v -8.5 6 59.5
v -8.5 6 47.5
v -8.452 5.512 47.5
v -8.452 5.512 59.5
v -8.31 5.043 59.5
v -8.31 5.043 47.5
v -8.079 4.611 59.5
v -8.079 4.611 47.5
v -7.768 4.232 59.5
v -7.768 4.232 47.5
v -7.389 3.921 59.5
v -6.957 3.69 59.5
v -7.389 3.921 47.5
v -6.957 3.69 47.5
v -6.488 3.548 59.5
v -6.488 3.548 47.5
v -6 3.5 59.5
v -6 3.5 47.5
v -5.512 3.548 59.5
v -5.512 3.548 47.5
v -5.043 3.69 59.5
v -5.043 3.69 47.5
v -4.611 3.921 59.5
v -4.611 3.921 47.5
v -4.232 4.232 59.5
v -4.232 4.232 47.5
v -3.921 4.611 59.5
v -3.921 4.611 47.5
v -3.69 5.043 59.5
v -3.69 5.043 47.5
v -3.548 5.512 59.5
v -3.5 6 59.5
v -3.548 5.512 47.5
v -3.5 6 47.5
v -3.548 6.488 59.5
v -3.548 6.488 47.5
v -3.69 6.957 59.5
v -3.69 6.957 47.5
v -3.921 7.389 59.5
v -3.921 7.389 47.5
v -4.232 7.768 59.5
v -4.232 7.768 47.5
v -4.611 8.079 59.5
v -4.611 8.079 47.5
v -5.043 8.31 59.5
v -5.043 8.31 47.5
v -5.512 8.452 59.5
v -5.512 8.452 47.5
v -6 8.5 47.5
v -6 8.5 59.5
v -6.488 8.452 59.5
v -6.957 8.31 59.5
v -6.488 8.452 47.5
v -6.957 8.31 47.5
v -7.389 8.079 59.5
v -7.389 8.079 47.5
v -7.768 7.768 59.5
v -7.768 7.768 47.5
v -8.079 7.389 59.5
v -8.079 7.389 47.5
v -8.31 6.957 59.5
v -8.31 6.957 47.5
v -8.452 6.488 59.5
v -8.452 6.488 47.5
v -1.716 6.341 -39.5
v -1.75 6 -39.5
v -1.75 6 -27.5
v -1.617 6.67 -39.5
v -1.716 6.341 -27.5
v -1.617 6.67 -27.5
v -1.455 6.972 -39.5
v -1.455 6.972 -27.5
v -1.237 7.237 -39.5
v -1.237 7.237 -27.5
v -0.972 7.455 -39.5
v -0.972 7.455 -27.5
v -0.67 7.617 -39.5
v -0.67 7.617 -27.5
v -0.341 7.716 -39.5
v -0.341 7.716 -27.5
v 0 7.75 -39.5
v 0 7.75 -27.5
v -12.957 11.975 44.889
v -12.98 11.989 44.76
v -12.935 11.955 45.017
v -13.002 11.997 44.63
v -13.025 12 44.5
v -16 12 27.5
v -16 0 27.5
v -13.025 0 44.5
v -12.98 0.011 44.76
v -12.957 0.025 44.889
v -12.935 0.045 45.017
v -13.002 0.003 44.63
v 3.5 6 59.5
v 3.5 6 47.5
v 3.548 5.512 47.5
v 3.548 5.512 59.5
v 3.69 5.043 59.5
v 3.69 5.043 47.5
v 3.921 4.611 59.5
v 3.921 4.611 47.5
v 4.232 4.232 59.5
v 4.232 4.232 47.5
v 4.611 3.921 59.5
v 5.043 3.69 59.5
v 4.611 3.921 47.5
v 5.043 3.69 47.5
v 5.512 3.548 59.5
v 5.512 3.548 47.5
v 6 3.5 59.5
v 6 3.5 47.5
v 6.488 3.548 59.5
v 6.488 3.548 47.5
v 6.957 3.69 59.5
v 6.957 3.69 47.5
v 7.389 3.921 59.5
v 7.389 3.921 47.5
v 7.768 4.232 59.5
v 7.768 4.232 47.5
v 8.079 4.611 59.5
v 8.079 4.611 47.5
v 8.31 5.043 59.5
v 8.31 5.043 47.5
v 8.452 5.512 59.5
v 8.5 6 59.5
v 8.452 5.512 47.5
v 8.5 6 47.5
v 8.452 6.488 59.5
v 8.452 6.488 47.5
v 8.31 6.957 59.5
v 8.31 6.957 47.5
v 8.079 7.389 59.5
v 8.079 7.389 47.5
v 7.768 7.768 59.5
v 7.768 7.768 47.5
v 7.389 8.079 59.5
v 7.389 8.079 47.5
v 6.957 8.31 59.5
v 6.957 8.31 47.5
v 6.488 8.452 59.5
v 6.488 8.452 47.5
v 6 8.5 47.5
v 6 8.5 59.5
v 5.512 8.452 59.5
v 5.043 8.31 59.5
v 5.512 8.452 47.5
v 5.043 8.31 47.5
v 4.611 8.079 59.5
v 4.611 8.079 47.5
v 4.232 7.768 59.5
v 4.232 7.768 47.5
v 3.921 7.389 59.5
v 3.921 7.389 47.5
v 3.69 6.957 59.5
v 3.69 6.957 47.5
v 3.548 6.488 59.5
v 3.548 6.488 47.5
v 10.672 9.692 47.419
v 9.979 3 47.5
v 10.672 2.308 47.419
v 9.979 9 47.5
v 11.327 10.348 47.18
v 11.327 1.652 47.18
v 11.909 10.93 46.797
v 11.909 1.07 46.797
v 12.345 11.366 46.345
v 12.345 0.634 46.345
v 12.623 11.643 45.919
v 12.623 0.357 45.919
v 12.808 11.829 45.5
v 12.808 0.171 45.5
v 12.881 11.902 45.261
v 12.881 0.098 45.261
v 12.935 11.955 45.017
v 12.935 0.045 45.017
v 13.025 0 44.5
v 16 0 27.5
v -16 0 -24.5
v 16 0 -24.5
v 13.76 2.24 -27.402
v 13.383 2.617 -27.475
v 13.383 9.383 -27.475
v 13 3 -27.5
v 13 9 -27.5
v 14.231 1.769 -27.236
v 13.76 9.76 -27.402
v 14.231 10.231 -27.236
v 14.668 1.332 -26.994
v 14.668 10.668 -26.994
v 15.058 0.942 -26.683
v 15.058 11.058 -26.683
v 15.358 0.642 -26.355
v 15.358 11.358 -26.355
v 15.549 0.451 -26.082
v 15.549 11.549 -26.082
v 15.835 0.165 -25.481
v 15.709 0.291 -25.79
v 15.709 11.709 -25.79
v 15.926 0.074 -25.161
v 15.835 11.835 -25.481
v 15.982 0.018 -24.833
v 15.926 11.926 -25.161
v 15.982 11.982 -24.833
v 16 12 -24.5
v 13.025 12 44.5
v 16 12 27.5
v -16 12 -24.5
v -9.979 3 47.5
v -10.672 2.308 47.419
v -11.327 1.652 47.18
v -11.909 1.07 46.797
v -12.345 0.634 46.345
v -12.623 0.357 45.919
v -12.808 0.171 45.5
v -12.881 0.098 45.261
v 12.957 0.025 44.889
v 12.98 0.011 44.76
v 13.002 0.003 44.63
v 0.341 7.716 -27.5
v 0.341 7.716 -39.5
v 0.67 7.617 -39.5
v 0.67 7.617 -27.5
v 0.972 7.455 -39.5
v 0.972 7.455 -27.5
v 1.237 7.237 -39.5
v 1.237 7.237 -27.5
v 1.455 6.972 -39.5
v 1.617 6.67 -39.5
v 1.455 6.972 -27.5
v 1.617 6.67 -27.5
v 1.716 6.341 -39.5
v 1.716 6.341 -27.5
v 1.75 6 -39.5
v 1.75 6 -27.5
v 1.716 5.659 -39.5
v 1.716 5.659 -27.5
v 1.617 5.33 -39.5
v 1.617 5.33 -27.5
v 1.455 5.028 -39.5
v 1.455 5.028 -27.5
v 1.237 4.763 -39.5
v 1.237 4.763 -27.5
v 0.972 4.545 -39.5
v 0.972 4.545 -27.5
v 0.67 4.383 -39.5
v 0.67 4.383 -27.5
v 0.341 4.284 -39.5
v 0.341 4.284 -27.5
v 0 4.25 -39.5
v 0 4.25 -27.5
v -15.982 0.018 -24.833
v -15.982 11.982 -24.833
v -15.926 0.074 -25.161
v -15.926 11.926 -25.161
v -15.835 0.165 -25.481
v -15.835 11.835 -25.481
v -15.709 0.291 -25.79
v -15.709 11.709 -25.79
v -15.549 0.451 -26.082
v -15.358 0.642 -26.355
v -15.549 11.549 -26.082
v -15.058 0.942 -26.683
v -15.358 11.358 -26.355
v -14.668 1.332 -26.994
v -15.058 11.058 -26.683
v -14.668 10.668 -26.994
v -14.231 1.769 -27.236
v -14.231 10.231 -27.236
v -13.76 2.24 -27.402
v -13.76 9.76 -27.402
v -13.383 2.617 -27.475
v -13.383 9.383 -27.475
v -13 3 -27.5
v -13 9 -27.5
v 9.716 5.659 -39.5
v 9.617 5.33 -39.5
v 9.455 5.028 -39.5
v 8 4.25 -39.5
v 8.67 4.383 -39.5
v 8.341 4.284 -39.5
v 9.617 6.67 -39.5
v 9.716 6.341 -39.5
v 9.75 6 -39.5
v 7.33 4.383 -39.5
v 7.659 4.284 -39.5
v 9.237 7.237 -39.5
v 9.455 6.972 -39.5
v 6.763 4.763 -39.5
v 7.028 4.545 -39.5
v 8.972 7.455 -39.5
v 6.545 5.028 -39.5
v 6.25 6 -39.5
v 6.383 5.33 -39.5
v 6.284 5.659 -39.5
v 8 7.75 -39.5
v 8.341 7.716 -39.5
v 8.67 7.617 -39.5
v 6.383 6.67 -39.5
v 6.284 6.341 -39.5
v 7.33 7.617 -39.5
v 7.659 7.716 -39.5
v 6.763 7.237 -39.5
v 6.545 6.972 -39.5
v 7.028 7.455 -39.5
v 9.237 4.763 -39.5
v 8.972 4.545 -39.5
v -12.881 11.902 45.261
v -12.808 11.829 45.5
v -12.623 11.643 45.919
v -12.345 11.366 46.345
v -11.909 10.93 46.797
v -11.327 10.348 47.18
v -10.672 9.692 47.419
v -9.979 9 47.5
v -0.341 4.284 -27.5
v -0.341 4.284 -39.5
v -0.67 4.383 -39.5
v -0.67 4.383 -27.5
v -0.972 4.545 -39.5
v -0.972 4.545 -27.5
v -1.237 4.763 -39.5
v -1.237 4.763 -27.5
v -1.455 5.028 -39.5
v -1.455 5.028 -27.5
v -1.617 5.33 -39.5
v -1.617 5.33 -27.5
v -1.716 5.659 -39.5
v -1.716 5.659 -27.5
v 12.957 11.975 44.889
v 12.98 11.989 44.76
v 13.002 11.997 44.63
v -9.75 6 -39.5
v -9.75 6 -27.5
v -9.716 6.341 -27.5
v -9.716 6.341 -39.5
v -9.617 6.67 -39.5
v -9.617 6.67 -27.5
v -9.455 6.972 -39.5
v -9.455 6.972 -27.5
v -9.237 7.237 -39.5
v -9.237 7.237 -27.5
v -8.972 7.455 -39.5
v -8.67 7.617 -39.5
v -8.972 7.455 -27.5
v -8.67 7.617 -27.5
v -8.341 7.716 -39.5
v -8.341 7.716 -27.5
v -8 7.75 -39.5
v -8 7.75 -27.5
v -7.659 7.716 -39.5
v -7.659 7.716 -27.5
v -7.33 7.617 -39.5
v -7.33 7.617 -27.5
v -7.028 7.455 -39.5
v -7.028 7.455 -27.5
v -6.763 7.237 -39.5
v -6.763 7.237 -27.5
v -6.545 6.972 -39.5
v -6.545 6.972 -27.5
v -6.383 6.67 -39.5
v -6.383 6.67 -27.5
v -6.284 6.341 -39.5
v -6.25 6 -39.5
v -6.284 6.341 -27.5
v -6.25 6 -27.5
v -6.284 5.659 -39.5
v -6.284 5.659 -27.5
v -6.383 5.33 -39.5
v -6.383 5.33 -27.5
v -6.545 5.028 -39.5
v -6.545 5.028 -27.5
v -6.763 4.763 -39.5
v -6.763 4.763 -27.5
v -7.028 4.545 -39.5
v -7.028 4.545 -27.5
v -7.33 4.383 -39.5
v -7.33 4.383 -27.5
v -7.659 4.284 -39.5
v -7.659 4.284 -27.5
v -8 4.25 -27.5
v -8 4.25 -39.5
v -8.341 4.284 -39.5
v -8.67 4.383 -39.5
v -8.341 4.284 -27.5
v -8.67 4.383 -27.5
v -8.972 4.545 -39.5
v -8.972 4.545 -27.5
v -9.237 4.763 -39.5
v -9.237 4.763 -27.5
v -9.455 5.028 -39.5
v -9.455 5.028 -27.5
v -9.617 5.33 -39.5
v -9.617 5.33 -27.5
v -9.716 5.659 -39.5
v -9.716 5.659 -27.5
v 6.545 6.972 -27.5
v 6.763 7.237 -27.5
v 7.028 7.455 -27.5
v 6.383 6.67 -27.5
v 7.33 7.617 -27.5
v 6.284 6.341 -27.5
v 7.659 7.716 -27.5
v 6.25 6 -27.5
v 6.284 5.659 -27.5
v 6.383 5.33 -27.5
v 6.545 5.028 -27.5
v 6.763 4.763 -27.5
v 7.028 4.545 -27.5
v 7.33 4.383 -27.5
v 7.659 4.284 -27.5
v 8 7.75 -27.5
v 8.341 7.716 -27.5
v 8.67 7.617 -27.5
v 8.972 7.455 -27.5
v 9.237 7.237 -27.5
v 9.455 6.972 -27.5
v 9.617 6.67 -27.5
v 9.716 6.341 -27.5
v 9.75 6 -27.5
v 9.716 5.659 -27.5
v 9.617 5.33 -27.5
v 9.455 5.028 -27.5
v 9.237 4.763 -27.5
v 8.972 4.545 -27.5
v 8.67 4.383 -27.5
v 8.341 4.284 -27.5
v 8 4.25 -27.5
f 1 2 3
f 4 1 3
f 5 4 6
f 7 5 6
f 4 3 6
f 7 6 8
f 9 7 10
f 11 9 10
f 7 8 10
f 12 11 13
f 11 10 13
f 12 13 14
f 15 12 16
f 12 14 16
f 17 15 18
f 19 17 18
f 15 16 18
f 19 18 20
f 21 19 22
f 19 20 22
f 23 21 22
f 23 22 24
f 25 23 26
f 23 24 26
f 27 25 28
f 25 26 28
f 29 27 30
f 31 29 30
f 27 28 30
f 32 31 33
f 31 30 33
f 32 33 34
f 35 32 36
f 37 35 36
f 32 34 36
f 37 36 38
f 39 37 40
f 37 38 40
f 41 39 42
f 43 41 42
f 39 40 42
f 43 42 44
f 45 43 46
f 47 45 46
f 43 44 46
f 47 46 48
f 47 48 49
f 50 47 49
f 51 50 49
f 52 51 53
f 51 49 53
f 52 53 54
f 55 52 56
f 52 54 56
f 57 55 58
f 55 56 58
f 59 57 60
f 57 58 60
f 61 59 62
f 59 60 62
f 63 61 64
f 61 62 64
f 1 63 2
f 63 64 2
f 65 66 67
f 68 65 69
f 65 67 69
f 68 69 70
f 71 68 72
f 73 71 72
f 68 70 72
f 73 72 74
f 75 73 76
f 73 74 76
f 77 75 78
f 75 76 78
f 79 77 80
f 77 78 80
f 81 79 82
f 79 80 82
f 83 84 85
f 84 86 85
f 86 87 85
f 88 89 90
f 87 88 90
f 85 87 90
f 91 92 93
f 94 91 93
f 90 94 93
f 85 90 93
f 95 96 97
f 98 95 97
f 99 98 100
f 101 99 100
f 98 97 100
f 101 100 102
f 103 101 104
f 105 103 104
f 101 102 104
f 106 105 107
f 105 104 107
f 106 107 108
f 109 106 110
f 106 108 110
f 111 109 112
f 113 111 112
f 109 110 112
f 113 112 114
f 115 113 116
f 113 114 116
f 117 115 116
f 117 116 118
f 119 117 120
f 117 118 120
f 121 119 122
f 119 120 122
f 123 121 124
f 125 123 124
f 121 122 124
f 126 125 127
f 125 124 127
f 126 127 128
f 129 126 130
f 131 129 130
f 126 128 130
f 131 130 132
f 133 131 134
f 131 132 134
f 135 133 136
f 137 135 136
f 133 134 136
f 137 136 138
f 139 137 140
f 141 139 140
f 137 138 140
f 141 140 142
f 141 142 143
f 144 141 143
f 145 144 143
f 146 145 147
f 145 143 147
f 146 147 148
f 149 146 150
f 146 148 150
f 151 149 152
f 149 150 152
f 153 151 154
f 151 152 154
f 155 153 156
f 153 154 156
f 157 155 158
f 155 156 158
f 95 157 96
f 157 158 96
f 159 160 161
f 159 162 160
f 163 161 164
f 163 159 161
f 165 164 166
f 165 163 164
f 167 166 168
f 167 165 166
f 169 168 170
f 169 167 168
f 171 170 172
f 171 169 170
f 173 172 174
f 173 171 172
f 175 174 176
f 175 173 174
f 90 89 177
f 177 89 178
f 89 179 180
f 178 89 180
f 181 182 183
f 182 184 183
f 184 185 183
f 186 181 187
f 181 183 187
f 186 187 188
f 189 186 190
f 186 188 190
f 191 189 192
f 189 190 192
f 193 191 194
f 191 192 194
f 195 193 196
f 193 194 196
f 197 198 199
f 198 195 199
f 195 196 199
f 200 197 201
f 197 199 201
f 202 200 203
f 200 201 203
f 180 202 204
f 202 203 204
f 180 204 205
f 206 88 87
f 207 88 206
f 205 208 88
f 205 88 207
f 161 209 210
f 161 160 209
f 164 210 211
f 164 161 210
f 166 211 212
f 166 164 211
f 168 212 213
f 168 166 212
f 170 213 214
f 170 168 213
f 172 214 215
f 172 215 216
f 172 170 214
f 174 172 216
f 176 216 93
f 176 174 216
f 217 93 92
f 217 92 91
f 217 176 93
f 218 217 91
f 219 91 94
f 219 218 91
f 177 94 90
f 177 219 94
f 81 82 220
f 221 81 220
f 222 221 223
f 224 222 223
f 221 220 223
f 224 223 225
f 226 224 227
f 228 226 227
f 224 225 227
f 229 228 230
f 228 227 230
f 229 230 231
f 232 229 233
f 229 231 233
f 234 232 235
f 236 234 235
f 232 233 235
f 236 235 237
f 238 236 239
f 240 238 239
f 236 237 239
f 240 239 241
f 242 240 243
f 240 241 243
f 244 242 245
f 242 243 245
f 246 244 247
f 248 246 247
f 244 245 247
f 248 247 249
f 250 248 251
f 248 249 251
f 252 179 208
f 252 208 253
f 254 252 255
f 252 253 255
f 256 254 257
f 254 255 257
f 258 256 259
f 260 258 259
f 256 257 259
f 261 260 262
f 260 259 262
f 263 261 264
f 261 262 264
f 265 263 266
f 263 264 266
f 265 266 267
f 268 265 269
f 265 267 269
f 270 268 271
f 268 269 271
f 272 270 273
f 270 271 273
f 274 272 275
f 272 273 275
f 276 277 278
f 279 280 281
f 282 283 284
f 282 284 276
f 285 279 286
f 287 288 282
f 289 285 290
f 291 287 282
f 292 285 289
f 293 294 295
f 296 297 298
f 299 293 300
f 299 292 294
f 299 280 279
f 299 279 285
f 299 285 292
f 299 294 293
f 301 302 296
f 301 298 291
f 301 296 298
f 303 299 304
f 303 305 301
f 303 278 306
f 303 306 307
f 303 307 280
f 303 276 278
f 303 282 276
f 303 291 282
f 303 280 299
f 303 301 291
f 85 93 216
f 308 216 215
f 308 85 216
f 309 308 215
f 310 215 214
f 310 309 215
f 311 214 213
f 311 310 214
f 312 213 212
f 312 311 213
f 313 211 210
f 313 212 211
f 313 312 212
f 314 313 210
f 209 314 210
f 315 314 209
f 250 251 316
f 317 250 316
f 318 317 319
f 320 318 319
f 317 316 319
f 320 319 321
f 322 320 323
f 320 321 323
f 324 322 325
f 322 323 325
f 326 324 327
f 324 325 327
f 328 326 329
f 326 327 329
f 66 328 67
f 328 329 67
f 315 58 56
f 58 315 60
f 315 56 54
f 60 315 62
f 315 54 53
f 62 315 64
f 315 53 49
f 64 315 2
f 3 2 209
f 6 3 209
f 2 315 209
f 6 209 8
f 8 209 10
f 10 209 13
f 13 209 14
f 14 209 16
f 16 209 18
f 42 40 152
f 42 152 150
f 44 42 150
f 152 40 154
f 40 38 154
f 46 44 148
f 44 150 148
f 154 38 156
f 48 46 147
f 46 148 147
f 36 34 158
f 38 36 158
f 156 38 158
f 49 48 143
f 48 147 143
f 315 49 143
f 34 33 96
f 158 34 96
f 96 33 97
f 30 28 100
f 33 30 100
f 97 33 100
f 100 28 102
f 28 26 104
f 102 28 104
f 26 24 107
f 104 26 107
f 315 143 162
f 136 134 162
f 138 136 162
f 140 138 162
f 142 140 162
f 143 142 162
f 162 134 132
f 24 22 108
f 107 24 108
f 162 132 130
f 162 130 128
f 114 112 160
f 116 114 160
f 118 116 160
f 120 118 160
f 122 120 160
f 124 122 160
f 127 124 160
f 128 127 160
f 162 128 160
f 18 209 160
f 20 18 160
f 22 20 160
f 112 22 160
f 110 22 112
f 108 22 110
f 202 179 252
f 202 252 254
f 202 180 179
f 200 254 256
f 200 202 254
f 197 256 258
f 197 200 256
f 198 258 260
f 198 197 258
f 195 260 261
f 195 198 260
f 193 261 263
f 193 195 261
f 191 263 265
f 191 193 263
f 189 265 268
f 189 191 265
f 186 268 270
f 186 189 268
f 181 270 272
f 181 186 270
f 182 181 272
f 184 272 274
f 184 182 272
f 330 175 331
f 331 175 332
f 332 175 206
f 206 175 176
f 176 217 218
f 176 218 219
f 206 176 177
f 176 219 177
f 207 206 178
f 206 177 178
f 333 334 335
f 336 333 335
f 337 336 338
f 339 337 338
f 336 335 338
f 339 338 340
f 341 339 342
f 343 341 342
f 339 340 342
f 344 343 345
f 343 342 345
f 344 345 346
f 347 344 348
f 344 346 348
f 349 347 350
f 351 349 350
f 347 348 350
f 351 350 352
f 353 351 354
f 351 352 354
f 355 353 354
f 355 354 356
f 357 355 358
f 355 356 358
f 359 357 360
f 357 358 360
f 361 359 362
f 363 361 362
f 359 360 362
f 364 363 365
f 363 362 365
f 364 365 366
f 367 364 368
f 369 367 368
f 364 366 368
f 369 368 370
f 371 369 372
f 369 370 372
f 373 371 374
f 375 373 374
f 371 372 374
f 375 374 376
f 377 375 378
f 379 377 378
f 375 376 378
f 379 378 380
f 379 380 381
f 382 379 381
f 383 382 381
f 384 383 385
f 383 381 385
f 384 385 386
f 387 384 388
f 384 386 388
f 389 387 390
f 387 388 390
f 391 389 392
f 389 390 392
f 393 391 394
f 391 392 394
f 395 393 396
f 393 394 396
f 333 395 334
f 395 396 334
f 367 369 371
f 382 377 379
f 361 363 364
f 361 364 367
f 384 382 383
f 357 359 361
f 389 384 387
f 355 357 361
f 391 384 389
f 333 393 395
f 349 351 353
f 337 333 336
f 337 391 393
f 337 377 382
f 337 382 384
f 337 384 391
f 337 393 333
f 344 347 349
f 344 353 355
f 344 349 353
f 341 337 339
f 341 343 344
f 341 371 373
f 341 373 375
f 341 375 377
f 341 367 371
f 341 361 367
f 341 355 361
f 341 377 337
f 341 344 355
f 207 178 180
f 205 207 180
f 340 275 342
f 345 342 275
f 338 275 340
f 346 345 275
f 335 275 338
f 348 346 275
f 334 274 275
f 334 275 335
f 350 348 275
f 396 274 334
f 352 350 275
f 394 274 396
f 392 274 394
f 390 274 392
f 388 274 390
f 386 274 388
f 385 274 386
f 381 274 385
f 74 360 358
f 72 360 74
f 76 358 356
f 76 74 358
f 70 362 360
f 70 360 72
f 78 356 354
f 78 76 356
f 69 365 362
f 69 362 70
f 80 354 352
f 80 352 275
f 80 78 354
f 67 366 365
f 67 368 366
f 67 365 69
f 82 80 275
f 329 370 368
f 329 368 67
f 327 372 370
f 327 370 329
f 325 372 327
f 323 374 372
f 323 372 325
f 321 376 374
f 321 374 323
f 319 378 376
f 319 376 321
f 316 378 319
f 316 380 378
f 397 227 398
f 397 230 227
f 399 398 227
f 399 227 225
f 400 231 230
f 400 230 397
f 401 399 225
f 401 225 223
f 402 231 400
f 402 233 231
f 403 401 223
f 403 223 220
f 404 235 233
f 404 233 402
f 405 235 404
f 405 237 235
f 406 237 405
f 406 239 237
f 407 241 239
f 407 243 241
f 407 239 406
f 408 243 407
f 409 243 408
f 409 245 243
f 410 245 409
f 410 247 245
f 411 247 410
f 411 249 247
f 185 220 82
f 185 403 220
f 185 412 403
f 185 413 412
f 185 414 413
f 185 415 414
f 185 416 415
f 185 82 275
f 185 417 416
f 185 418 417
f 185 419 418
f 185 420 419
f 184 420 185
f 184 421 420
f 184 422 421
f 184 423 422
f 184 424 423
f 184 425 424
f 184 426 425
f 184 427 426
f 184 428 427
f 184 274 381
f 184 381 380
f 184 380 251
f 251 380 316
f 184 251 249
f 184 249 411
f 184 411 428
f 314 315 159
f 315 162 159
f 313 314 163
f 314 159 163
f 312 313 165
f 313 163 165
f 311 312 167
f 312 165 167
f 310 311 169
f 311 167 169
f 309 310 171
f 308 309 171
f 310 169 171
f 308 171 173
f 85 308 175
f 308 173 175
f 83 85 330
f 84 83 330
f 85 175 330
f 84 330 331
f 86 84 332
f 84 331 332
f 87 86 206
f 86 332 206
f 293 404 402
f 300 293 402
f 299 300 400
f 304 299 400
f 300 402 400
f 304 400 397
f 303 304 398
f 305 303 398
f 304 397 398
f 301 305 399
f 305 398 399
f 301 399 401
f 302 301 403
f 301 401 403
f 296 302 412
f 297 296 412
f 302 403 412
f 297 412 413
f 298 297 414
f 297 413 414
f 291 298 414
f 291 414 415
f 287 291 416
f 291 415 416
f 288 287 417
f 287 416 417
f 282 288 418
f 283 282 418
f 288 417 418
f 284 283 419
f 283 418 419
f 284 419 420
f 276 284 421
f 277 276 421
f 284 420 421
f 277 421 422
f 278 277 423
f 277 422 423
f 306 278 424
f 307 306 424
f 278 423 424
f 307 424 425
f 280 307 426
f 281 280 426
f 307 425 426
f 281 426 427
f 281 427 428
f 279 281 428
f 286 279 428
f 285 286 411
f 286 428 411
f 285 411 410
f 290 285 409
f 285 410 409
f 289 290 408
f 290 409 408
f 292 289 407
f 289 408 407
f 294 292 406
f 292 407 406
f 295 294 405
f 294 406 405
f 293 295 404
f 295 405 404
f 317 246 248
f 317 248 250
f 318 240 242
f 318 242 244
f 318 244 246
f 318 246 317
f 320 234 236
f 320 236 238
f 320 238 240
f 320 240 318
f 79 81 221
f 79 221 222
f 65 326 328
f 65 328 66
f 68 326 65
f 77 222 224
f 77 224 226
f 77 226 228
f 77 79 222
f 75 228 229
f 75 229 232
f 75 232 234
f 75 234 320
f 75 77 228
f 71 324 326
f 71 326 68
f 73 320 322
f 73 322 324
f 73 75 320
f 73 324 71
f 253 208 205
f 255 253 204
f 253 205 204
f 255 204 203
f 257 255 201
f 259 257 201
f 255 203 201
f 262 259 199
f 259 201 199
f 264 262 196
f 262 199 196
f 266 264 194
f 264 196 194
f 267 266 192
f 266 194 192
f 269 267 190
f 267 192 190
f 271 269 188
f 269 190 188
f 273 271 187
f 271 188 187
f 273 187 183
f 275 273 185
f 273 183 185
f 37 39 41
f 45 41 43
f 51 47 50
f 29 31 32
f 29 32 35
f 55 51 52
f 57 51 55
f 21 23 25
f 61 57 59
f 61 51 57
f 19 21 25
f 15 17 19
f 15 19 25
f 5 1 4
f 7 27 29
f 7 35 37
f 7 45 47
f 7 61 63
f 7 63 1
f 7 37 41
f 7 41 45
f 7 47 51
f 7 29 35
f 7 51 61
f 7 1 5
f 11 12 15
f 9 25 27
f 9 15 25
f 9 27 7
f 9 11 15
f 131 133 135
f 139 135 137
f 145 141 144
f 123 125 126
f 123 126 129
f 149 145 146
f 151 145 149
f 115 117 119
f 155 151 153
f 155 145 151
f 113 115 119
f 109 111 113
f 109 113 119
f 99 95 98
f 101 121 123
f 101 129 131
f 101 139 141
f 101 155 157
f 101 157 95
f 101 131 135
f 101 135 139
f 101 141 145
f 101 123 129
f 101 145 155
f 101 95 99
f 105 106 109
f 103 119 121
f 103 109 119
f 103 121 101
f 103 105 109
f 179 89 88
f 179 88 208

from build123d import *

# Parameters (mm, degrees)
EXTRUDE_1_DEPTH = 12
EXTRUDE_2_DEPTH = 12
SKETCH_2_R      = 2.5
EXTRUDE_3_DEPTH = 12
SKETCH_3_R      = 1.75
EXTRUDE_4_DEPTH = 12
FILLET_1_R      = 3


with BuildPart() as part:
    # 草图1 → 凸台-拉伸1 (new body)
    with BuildSketch(Plane(origin=(0, 0, 0), x_dir=(1, 0, 0), z_dir=(0, 1, 0))):
        Polygon((16, 27.5), (-16, 27.5), (-16, -27.5), (0, -27.5), (16, -27.5), align=None)
    extrude(amount=EXTRUDE_1_DEPTH)

    # 草图1<3> → 凸台-拉伸2 (add)
    with BuildSketch(Plane(origin=(0, 0, 0), x_dir=(1, 0, 0), z_dir=(0, 1, 0))):
        Polygon((-16, -27.5), (-12.5, -47.5), (12.5, -47.5), (16, -27.5), align=None)
    extrude(amount=EXTRUDE_2_DEPTH)

    # 草图2 → 凸台-拉伸3 (add)
    with BuildSketch(Plane.XY.offset(47.5)):
        with Locations((6, 6)):
            Circle(SKETCH_2_R)
        with Locations((-6, 6)):
            Circle(SKETCH_2_R)
    extrude(amount=EXTRUDE_3_DEPTH)

    # 草图3 → 凸台-拉伸4 (add)
    with BuildSketch(Plane(origin=(0, 0, -27.5), x_dir=(-1, 0, 0), z_dir=(0, 0, -1))):
        with Locations((0, 6)):
            Circle(SKETCH_3_R)
        with Locations((8, 6)):
            Circle(SKETCH_3_R)
        with Locations((-8, 6)):
            Circle(SKETCH_3_R)
    extrude(amount=EXTRUDE_4_DEPTH)

    # 圆角1
    fillet_1_edges = [part.edges().sort_by_distance(p)[0] for p in [
        (0, 0, 47.5),
        (-12.5, 6, 47.5),
        (0, 12, 47.5),
        (12.5, 6, 47.5),
        (-16, 6, -27.5),
        (0, 0, -27.5),
        (0, 12, -27.5),
        (16, 6, -27.5),
    ]]
    fillet(fillet_1_edges, radius=FILLET_1_R)


solid = part.part
